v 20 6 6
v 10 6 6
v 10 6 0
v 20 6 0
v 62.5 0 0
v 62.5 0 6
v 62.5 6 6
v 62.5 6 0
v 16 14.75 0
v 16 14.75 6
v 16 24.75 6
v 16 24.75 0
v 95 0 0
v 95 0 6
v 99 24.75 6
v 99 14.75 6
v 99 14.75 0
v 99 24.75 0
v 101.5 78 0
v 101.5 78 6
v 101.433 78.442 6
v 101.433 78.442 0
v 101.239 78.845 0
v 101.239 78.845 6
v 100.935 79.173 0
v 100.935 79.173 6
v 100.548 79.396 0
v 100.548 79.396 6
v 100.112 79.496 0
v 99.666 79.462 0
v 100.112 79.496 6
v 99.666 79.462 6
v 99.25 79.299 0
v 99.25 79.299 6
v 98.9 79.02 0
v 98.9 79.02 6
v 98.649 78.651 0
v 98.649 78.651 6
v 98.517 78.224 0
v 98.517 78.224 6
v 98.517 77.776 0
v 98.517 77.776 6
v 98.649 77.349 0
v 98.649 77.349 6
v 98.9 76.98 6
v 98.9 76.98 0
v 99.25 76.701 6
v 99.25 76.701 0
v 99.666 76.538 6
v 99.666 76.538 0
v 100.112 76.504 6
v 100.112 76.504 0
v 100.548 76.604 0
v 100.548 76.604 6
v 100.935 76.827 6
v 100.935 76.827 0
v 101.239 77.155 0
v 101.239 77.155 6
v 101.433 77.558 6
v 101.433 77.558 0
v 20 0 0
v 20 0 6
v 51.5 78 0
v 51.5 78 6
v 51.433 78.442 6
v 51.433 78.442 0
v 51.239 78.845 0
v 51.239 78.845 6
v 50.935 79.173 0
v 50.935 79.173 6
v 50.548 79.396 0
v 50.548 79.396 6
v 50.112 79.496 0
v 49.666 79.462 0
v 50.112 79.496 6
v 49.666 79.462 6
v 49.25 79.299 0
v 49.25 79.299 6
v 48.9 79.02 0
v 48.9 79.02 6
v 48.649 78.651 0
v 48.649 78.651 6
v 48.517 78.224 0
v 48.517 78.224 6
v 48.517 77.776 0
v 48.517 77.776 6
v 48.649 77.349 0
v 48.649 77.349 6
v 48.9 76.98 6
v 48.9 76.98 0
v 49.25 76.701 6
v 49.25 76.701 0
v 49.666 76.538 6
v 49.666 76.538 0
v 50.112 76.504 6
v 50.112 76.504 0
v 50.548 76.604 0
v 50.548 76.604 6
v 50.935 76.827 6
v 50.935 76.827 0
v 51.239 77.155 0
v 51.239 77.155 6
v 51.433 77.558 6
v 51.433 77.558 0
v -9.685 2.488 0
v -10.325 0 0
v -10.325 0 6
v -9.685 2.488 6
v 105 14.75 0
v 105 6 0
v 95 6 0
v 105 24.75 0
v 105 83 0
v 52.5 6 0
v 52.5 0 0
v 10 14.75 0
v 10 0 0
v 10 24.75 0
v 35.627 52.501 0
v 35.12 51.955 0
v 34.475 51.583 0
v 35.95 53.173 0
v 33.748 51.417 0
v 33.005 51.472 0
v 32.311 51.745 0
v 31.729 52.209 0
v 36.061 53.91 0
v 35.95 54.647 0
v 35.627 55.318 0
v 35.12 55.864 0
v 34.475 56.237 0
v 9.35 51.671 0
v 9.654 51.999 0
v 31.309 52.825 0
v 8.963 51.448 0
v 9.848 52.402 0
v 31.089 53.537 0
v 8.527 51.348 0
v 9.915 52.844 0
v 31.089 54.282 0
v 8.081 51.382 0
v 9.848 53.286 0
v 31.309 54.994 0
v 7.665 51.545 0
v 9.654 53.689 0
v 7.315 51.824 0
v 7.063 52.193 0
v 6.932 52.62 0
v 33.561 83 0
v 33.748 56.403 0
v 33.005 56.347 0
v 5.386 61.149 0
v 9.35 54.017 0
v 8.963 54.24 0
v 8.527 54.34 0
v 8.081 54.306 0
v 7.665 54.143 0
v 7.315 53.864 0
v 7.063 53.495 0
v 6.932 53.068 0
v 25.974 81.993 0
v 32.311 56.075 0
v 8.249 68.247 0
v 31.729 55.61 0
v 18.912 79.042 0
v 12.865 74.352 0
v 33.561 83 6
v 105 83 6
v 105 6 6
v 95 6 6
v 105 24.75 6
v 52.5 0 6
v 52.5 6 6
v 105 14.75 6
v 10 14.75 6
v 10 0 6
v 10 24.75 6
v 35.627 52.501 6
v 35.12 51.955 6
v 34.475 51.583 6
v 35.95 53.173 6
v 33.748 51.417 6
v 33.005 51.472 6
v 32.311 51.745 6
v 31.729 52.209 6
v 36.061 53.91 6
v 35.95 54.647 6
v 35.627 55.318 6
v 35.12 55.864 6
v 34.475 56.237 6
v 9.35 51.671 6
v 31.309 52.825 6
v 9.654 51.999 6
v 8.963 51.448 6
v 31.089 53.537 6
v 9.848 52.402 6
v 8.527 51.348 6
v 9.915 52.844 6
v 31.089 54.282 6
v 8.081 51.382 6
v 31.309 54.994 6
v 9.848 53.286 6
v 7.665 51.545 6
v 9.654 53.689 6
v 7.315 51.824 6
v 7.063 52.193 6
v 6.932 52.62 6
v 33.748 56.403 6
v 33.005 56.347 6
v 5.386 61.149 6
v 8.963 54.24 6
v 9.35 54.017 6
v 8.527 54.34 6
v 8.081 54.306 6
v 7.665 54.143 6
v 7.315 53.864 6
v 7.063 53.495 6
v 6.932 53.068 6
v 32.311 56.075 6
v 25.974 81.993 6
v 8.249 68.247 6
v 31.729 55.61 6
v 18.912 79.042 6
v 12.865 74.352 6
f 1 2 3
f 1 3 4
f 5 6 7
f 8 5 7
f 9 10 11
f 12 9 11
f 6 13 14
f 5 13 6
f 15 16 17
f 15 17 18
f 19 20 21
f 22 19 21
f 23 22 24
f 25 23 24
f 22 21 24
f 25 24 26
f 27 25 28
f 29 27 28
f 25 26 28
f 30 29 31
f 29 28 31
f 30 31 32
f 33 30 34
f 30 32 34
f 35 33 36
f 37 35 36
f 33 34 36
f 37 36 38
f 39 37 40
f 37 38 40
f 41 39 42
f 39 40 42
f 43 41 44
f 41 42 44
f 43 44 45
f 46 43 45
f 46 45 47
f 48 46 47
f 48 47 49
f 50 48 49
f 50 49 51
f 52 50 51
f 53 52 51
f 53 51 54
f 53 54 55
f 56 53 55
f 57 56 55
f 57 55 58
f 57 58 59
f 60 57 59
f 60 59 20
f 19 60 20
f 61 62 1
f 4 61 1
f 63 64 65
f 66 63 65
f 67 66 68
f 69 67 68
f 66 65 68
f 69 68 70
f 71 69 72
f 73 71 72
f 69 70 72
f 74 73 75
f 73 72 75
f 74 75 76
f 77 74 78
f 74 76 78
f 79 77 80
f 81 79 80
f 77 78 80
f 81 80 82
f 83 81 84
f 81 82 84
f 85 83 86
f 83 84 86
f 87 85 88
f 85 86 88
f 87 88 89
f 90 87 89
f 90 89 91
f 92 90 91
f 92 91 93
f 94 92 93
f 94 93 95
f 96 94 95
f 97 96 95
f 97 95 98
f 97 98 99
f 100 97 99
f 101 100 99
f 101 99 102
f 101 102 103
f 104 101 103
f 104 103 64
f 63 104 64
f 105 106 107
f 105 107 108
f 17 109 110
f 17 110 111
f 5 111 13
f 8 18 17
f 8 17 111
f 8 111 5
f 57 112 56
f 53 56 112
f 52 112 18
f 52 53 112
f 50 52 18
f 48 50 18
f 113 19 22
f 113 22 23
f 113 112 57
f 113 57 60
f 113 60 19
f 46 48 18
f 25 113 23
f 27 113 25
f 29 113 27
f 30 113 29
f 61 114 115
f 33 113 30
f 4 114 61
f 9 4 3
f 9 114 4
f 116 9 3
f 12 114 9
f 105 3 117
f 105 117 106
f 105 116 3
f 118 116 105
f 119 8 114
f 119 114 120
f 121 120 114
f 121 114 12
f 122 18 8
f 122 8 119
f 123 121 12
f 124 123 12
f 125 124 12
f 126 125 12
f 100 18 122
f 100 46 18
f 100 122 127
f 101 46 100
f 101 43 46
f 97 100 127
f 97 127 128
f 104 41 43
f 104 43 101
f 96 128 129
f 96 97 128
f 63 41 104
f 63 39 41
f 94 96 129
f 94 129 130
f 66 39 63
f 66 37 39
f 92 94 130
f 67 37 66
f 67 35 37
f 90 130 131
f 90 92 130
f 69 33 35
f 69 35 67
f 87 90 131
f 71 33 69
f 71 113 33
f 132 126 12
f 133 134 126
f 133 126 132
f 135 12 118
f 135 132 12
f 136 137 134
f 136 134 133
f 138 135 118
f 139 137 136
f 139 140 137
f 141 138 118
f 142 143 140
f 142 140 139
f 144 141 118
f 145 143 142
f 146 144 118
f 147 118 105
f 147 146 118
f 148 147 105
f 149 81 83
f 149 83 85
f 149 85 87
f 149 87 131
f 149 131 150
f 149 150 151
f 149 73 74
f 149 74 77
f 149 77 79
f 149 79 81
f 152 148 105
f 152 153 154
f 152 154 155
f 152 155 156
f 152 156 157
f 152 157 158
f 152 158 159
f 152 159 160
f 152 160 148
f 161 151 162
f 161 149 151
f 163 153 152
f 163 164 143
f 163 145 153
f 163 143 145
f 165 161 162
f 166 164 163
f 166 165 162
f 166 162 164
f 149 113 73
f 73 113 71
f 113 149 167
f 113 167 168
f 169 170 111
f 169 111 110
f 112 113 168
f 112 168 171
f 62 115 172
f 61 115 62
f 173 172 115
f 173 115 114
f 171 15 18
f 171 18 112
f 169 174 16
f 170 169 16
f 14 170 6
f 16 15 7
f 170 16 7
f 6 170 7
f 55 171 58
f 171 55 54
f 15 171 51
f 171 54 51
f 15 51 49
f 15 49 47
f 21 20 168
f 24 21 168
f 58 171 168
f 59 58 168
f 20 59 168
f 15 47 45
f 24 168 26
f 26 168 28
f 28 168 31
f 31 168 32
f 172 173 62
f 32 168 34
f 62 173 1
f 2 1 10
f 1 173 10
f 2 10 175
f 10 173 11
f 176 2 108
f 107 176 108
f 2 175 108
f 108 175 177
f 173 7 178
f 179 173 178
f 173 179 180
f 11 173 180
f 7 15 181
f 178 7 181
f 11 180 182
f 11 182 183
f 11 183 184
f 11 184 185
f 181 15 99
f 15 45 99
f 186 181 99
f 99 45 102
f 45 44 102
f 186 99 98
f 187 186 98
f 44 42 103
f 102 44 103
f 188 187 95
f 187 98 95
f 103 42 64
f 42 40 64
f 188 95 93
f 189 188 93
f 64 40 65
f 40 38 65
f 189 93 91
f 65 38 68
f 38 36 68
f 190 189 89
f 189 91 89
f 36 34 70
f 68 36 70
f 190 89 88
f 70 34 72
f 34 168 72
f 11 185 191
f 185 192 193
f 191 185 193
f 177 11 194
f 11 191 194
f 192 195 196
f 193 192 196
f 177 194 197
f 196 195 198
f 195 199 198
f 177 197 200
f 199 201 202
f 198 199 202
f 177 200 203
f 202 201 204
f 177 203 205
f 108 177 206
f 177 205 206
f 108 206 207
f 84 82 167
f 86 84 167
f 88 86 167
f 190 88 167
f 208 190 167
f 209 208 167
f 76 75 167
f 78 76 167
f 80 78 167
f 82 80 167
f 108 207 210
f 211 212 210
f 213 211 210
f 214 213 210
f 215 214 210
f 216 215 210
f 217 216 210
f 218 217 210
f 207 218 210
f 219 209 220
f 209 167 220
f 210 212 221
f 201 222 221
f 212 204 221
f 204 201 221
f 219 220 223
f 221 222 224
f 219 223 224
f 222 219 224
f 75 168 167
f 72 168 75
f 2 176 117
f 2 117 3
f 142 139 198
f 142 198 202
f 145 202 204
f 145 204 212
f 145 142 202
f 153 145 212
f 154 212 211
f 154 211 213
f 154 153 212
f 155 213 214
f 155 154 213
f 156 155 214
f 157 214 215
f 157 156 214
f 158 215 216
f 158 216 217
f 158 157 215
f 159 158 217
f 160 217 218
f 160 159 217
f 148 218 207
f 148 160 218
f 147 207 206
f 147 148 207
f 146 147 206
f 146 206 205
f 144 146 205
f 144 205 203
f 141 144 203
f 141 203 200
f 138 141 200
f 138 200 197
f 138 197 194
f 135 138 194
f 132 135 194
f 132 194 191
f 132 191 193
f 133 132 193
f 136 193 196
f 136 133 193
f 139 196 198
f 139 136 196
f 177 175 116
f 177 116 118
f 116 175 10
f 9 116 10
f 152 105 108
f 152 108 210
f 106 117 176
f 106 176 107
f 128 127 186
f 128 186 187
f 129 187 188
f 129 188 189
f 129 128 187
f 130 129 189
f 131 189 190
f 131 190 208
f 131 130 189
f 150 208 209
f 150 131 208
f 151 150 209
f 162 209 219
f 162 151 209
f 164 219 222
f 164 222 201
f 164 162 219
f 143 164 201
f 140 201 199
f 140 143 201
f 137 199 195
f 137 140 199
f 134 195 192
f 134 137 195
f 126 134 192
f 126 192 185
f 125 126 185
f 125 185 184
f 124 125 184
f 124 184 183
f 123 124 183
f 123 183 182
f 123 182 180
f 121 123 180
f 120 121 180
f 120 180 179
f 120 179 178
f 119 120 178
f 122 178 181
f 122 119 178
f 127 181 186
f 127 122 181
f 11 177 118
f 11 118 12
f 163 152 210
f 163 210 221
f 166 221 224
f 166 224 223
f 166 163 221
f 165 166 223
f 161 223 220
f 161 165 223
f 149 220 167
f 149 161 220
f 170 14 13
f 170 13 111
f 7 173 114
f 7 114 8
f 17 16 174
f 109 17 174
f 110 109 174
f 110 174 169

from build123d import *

# Parameters (mm, degrees)
SKETCH1_R           = 2.5
BOSS_EXTRUDE1_DEPTH = 6
SKETCH2_W           = 10
SKETCH2_H           = 6
SKETCH2_W_2         = 6
SKETCH2_H_2         = 10
CUT_EXTRUDE1_DEPTH  = 134.97761007
SKETCH3_R           = 1.5
CUT_EXTRUDE2_DEPTH  = 134.97761007
CAVITY1_OUTLINE_R   = 1.5
CAVITY1_DEPTH       = 6


# Read off the part's stored shape, not the designer's step: Cavity1
with BuildPart() as part:
    # Sketch1 → Boss-Extrude1 (new body)
    with BuildSketch(Plane.XY):
        with BuildLine():
            Line((-9.685424338, 2.488484559), (5.386220056, 61.148792841))
            ThreePointArc((5.386220056, 61.148792841), (15.733633721, 76.897010412), (33.561388608, 83))
            Line((33.561388608, 83), (105, 83))
            Line((105, 83), (105, 0))
            Line((105, 0), (-10.324792855, 0))
            Line((-10.324792855, 0), (-9.685424338, 2.488484559))
        make_face()
        with Locations((33.561388608, 53.909722104)):
            Circle(SKETCH1_R, mode=Mode.SUBTRACT)
    extrude(amount=BOSS_EXTRUDE1_DEPTH)

    # Sketch2 → Cut-Extrude1 (cut, through all)
    with BuildSketch(Plane.XY.offset(6)):
        with Locations((15, 3)):
            Rectangle(SKETCH2_W, SKETCH2_H)
        with Locations((57.5, 3)):
            Rectangle(SKETCH2_W, SKETCH2_H)
        with Locations((100, 3)):
            Rectangle(SKETCH2_W, SKETCH2_H)
        with Locations((102, 19.75)):
            Rectangle(SKETCH2_W_2, SKETCH2_H_2)
        with Locations((13, 19.75)):
            Rectangle(SKETCH2_W_2, SKETCH2_H_2)
    extrude(amount=-CUT_EXTRUDE1_DEPTH, mode=Mode.SUBTRACT)

    # Sketch3 → Cut-Extrude2 (cut, through all)
    with BuildSketch(Plane.XY.offset(6)):
        with Locations((50, 78)):
            Circle(SKETCH3_R)
        with Locations((100, 78)):
            Circle(SKETCH3_R)
    extrude(amount=-CUT_EXTRUDE2_DEPTH, mode=Mode.SUBTRACT)

    # Cavity1 outline → Cavity1 (cut)
    with BuildSketch(Plane.XY):
        with Locations((8.414860226, 52.844005614)):
            Circle(CAVITY1_OUTLINE_R)
    extrude(amount=CAVITY1_DEPTH, mode=Mode.SUBTRACT)


solid = part.part
